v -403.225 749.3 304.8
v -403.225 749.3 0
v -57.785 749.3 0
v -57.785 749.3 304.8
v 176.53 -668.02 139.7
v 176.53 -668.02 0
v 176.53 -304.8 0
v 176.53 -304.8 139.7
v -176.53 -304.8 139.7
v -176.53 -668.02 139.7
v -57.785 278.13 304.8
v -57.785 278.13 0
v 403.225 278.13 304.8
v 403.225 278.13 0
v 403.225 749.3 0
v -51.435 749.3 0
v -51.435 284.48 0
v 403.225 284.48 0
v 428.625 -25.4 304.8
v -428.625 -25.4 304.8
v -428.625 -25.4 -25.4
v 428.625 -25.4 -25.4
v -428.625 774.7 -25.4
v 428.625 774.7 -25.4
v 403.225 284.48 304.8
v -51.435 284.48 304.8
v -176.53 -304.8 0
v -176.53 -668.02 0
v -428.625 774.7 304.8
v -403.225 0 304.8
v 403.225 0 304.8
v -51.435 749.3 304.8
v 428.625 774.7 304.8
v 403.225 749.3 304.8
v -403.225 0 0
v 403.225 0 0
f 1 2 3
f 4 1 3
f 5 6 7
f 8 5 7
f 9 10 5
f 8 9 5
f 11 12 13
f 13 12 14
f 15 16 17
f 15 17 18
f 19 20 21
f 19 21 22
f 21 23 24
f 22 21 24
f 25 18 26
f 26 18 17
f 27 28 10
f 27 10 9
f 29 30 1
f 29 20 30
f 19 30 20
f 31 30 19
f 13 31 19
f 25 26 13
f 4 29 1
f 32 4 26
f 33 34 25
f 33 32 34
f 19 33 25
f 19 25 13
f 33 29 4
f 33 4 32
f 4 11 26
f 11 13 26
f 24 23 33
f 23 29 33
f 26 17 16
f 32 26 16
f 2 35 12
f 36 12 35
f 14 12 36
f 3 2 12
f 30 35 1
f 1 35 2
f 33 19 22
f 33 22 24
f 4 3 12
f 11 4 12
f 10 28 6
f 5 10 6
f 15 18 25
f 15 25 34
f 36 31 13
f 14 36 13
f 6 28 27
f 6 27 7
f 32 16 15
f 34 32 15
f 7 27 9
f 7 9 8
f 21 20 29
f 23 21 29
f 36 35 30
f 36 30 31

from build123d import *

# Parameters (mm, degrees)
F0_W     = 857.25
F0_H     = 800.1
F0_W_2   = 806.45
F0_H_2   = 749.3
F1_DEPTH = 304.8
F2_DEPTH = 25.4
F3_W     = 353.06
F3_H     = 363.22
F4_DEPTH = 139.7
F6_DEPTH = 304.8


with BuildPart() as f1:
    # F0 (on Top) → F1 (new body)
    with BuildSketch(Plane.XY):
        with Locations((0, 374.65)):
            Rectangle(F0_W, F0_H)
        with Locations((0, 374.65)):
            Rectangle(F0_W_2, F0_H_2, mode=Mode.SUBTRACT)
    extrude(amount=F1_DEPTH)

    # F0 (on Top) → F2 (join)
    with BuildSketch(Plane.XY):
        with Locations((0, 374.65)):
            Rectangle(F0_W, F0_H)
        with Locations((0, 374.65)):
            Rectangle(F0_W_2, F0_H_2, mode=Mode.SUBTRACT)
        with Locations((0, 374.65)):
            Rectangle(F0_W_2, F0_H_2)
    extrude(amount=-F2_DEPTH)

    # F5 (on face) → F6 (join, through all)
    with BuildSketch(Plane.XY):
        Polygon((-51.435, 278.13), (403.225, 278.13), (403.225, 284.48), (-51.435, 284.48), (-51.435, 749.3), (-57.785, 749.3), (-57.785, 284.48), (-57.785, 278.13), align=None)
    extrude(amount=F6_DEPTH)


with BuildPart() as f4:
    # F3 (on Top) → F4 (new body)
    with BuildSketch(Plane.XY):
        with Locations((0, -486.41)):
            Rectangle(F3_W, F3_H)
    extrude(amount=F4_DEPTH)


solid = Compound([f1.part, f4.part])
